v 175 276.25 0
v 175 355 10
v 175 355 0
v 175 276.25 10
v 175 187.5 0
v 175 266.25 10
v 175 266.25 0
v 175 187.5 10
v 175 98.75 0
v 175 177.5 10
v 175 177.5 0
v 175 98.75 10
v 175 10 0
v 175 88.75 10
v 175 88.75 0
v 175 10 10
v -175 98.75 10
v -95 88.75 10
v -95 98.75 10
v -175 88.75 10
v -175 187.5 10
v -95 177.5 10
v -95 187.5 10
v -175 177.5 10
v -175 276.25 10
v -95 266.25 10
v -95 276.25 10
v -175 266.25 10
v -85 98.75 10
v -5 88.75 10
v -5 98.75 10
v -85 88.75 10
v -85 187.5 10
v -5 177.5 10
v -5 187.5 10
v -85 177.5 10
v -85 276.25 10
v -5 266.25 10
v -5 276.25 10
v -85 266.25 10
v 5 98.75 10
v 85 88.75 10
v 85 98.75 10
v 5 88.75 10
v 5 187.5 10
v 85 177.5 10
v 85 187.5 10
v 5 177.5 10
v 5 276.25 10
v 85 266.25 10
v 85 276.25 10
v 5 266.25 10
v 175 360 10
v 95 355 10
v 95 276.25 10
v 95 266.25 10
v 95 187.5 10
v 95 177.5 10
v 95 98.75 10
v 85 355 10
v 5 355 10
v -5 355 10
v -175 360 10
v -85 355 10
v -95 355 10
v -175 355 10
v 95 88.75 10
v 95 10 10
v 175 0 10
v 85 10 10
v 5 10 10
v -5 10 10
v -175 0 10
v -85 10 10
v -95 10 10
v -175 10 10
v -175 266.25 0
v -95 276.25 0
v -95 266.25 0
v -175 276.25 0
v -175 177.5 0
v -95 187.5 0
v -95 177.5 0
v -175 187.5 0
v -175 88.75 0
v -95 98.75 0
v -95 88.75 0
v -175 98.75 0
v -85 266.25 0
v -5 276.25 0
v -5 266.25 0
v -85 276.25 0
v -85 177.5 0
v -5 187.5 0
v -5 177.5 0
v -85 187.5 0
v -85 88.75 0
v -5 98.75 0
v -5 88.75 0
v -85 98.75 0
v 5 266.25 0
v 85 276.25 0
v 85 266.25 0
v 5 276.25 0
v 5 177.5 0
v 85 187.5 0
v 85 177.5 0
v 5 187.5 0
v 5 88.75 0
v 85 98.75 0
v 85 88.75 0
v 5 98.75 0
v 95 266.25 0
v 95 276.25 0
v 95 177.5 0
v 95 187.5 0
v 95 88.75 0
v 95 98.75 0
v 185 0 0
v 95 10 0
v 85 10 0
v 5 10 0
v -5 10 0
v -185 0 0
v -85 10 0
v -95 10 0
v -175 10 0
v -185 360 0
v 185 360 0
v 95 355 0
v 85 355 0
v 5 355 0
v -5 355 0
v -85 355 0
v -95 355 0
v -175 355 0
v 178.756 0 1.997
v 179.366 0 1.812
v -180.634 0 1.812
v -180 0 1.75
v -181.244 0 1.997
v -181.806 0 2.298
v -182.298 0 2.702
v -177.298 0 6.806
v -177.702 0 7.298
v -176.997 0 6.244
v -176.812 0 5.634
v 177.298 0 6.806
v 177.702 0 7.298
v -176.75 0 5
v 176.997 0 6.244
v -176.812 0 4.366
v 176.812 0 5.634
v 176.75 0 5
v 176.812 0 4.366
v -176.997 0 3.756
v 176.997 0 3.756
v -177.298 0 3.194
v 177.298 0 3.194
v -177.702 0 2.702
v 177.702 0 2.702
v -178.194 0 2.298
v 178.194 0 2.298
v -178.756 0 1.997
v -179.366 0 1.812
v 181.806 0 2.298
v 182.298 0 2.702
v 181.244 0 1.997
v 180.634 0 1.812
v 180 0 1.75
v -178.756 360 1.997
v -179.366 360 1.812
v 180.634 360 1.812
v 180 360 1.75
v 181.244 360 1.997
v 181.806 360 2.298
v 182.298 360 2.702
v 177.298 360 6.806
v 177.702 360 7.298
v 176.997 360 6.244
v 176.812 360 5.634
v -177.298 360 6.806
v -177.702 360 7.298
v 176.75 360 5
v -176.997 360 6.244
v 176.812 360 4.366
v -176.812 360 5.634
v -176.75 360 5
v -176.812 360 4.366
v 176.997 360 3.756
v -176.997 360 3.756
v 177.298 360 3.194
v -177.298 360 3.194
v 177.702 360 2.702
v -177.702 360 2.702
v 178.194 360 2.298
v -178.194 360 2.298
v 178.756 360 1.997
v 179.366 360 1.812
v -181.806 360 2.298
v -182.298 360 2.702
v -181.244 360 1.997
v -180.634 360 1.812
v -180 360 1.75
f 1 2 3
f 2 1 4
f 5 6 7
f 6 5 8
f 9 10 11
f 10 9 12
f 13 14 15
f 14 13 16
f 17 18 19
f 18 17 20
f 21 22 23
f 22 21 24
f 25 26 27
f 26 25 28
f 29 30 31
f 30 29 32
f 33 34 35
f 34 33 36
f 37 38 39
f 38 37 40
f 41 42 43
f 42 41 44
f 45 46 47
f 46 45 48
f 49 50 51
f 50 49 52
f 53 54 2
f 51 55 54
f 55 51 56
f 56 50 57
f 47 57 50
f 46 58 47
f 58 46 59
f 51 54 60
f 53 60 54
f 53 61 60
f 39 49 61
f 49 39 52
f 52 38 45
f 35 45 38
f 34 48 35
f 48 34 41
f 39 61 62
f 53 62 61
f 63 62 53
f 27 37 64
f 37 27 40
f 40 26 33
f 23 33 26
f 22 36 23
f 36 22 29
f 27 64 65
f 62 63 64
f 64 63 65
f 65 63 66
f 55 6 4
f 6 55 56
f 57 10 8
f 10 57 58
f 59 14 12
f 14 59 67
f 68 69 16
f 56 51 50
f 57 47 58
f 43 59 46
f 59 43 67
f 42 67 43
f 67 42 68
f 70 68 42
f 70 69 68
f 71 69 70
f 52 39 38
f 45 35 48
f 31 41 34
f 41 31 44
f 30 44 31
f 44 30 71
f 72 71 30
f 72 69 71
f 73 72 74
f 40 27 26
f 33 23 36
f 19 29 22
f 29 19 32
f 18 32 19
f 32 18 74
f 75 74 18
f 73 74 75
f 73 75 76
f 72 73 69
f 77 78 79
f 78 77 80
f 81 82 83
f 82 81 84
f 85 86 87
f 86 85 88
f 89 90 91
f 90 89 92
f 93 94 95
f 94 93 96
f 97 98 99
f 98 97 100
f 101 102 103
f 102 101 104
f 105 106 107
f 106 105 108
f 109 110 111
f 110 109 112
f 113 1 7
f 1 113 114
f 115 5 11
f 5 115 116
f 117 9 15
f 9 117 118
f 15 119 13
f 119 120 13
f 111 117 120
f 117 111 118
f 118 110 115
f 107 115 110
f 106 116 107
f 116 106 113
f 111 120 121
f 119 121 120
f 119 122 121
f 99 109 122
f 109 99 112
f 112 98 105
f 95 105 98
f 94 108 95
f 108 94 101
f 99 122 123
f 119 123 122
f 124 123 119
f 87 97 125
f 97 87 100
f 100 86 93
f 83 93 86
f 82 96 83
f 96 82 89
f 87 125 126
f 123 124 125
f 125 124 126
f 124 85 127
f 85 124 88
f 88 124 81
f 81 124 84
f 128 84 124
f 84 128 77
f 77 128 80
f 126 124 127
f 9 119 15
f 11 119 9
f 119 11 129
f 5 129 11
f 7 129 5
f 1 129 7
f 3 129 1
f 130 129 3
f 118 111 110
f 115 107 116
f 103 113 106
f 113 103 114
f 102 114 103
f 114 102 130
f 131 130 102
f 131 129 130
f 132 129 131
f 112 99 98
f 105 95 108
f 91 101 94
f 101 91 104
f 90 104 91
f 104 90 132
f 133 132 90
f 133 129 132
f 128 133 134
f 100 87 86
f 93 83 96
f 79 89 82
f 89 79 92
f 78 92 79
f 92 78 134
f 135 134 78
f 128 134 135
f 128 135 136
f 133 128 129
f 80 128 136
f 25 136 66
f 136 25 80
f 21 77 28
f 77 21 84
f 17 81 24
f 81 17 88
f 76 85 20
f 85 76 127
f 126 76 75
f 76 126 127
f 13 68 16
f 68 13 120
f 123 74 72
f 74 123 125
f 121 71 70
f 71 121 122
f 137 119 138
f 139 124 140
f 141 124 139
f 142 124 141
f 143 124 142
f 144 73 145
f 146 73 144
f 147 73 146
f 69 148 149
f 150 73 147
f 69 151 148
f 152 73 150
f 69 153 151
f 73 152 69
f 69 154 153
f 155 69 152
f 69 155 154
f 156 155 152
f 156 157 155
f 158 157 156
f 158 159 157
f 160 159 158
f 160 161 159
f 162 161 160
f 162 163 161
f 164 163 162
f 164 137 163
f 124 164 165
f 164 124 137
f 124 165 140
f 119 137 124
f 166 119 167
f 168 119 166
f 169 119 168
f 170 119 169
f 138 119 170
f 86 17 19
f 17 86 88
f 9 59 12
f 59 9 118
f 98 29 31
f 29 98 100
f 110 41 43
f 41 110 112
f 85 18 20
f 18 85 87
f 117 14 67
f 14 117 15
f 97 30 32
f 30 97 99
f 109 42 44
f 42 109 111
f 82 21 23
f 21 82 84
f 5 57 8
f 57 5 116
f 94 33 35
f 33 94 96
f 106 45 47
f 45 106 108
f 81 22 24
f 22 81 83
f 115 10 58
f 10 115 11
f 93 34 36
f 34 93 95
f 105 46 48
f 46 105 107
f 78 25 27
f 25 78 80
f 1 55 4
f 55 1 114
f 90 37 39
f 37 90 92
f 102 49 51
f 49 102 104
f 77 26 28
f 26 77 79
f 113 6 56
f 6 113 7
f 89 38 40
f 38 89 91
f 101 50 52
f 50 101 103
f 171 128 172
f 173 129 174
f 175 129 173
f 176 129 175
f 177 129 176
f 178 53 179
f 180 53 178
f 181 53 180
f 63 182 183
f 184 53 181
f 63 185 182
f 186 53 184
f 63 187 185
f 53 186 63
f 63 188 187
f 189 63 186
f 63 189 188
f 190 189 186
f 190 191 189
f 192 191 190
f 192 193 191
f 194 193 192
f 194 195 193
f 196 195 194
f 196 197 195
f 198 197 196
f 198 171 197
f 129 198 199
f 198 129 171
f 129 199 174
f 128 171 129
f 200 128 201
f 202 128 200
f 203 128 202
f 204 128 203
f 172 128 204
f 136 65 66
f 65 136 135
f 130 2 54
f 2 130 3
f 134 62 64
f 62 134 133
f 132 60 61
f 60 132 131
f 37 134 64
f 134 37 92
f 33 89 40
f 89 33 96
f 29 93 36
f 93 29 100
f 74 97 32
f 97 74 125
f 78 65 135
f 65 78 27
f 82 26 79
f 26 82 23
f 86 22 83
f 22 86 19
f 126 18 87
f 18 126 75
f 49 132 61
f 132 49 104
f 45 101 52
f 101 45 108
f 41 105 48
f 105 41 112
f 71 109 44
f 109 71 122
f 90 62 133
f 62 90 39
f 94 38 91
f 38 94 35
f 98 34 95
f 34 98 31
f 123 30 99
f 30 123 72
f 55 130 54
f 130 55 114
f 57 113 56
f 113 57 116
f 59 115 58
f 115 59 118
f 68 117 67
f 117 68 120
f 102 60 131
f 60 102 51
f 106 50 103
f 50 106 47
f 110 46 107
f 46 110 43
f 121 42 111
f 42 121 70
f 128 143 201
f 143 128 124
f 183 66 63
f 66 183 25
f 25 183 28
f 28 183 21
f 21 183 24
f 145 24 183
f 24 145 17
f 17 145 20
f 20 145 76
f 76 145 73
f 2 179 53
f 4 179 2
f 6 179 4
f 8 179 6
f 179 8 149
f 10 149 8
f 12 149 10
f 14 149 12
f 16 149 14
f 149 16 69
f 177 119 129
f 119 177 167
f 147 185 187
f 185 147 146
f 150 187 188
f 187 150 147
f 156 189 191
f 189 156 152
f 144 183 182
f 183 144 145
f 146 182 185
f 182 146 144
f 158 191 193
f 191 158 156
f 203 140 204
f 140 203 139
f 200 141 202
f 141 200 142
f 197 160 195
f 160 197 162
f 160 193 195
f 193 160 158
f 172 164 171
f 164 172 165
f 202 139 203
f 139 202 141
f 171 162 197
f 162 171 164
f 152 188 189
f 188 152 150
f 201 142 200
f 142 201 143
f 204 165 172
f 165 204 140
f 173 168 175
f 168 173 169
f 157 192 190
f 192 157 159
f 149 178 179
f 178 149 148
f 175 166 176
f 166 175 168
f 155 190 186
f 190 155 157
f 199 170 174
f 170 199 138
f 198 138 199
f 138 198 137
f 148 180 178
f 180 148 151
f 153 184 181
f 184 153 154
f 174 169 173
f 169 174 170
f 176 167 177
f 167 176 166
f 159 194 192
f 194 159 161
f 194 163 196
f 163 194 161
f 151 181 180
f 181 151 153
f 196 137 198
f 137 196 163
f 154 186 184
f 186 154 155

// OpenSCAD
module cage_panel()
{
  // Dimensions
  width = 370;
  height = 360;
  thick = 10;
  bar_size = 10;
  hole_rad = 3.25; // 6.5mm diameter clearance for M6

  // Y-positions of horizontal bars (Centers)
  // Calculated to be uniform: 5, 93.75, 182.5, 271.25, 360
  // Bar 0: Y=0..10 (Full bar)
  // Bar 4: Y=355..360 (Half bar at top)
  bar_centers = [5, 93.75, 182.5, 271.25, 360]; // X-positions of vertical bars (Centers)
  // -180 (Left Col), -90, 0, 90, 180 (Right Col)
  // Inner bars at -90, 0, 90
  vert_centers = [-90, 0, 90];

  difference()
  {
    union()
    {
      // 1. Left Column (Mitered)
      // Extrudes along Y. Profile in XZ.
      // Outer corner at X=-185. Inner corner at X=-175.
      // Miter slope: At Z=0 (Outer), X=-185. At Z=10 (Inner), X=-175.
      translate([0, height / 2, 0]) rotate([90, 0, 0]) linear_extrude(height, center = true)
        polygon(points = [[-185, 0], [-175, 0], [-175, 10], [-185, 0]]); // 2. Right Column (Mitered)
      translate([0, height / 2, 0]) rotate([90, 0, 0]) linear_extrude(height, center = true)
        polygon(points = [[185, 0], [175, 0], [175, 10], [185, 0]]); // 3. Horizontal Bars
      for(i = [0:4])
      {
        y_c = bar_centers[i]; // Determine bar height and offset based on position
        // Bottom bar (i=0): Full 10mm, Center 5. Range 0..10
        // Top bar (i=4): Half 5mm, Center 360? No, Range 355..360.
        // Others: Full 10mm.

        b_h = (i == 4) ? 5 : 10;
        y_pos = (i == 4) ? 357.5 : y_c; // Bar spans between columns (-175 to 175)
        translate([0, y_pos, thick / 2]) cube([350, b_h, thick], center = true);
      }

      // 4. Intermediate Vertical Bars
      for(x_c = vert_centers)
      {
        translate([x_c, height / 2, thick / 2]) cube([bar_size, height, thick], center = true);
      }
    }

    // Subtract Holes for Threaded Rods
    // Located at the center of the corner bars (-180, 5) and (180, 5)
    // Running along Y axis
    translate([-180, height / 2, 5]) rotate([90, 0, 0]) cylinder(r = hole_rad, h = height + 1, center = true, $fn = 32);

    translate([180, height / 2, 5]) rotate([90, 0, 0]) cylinder(r = hole_rad, h = height + 1, center = true, $fn = 32);
  }
}

cage_panel();
